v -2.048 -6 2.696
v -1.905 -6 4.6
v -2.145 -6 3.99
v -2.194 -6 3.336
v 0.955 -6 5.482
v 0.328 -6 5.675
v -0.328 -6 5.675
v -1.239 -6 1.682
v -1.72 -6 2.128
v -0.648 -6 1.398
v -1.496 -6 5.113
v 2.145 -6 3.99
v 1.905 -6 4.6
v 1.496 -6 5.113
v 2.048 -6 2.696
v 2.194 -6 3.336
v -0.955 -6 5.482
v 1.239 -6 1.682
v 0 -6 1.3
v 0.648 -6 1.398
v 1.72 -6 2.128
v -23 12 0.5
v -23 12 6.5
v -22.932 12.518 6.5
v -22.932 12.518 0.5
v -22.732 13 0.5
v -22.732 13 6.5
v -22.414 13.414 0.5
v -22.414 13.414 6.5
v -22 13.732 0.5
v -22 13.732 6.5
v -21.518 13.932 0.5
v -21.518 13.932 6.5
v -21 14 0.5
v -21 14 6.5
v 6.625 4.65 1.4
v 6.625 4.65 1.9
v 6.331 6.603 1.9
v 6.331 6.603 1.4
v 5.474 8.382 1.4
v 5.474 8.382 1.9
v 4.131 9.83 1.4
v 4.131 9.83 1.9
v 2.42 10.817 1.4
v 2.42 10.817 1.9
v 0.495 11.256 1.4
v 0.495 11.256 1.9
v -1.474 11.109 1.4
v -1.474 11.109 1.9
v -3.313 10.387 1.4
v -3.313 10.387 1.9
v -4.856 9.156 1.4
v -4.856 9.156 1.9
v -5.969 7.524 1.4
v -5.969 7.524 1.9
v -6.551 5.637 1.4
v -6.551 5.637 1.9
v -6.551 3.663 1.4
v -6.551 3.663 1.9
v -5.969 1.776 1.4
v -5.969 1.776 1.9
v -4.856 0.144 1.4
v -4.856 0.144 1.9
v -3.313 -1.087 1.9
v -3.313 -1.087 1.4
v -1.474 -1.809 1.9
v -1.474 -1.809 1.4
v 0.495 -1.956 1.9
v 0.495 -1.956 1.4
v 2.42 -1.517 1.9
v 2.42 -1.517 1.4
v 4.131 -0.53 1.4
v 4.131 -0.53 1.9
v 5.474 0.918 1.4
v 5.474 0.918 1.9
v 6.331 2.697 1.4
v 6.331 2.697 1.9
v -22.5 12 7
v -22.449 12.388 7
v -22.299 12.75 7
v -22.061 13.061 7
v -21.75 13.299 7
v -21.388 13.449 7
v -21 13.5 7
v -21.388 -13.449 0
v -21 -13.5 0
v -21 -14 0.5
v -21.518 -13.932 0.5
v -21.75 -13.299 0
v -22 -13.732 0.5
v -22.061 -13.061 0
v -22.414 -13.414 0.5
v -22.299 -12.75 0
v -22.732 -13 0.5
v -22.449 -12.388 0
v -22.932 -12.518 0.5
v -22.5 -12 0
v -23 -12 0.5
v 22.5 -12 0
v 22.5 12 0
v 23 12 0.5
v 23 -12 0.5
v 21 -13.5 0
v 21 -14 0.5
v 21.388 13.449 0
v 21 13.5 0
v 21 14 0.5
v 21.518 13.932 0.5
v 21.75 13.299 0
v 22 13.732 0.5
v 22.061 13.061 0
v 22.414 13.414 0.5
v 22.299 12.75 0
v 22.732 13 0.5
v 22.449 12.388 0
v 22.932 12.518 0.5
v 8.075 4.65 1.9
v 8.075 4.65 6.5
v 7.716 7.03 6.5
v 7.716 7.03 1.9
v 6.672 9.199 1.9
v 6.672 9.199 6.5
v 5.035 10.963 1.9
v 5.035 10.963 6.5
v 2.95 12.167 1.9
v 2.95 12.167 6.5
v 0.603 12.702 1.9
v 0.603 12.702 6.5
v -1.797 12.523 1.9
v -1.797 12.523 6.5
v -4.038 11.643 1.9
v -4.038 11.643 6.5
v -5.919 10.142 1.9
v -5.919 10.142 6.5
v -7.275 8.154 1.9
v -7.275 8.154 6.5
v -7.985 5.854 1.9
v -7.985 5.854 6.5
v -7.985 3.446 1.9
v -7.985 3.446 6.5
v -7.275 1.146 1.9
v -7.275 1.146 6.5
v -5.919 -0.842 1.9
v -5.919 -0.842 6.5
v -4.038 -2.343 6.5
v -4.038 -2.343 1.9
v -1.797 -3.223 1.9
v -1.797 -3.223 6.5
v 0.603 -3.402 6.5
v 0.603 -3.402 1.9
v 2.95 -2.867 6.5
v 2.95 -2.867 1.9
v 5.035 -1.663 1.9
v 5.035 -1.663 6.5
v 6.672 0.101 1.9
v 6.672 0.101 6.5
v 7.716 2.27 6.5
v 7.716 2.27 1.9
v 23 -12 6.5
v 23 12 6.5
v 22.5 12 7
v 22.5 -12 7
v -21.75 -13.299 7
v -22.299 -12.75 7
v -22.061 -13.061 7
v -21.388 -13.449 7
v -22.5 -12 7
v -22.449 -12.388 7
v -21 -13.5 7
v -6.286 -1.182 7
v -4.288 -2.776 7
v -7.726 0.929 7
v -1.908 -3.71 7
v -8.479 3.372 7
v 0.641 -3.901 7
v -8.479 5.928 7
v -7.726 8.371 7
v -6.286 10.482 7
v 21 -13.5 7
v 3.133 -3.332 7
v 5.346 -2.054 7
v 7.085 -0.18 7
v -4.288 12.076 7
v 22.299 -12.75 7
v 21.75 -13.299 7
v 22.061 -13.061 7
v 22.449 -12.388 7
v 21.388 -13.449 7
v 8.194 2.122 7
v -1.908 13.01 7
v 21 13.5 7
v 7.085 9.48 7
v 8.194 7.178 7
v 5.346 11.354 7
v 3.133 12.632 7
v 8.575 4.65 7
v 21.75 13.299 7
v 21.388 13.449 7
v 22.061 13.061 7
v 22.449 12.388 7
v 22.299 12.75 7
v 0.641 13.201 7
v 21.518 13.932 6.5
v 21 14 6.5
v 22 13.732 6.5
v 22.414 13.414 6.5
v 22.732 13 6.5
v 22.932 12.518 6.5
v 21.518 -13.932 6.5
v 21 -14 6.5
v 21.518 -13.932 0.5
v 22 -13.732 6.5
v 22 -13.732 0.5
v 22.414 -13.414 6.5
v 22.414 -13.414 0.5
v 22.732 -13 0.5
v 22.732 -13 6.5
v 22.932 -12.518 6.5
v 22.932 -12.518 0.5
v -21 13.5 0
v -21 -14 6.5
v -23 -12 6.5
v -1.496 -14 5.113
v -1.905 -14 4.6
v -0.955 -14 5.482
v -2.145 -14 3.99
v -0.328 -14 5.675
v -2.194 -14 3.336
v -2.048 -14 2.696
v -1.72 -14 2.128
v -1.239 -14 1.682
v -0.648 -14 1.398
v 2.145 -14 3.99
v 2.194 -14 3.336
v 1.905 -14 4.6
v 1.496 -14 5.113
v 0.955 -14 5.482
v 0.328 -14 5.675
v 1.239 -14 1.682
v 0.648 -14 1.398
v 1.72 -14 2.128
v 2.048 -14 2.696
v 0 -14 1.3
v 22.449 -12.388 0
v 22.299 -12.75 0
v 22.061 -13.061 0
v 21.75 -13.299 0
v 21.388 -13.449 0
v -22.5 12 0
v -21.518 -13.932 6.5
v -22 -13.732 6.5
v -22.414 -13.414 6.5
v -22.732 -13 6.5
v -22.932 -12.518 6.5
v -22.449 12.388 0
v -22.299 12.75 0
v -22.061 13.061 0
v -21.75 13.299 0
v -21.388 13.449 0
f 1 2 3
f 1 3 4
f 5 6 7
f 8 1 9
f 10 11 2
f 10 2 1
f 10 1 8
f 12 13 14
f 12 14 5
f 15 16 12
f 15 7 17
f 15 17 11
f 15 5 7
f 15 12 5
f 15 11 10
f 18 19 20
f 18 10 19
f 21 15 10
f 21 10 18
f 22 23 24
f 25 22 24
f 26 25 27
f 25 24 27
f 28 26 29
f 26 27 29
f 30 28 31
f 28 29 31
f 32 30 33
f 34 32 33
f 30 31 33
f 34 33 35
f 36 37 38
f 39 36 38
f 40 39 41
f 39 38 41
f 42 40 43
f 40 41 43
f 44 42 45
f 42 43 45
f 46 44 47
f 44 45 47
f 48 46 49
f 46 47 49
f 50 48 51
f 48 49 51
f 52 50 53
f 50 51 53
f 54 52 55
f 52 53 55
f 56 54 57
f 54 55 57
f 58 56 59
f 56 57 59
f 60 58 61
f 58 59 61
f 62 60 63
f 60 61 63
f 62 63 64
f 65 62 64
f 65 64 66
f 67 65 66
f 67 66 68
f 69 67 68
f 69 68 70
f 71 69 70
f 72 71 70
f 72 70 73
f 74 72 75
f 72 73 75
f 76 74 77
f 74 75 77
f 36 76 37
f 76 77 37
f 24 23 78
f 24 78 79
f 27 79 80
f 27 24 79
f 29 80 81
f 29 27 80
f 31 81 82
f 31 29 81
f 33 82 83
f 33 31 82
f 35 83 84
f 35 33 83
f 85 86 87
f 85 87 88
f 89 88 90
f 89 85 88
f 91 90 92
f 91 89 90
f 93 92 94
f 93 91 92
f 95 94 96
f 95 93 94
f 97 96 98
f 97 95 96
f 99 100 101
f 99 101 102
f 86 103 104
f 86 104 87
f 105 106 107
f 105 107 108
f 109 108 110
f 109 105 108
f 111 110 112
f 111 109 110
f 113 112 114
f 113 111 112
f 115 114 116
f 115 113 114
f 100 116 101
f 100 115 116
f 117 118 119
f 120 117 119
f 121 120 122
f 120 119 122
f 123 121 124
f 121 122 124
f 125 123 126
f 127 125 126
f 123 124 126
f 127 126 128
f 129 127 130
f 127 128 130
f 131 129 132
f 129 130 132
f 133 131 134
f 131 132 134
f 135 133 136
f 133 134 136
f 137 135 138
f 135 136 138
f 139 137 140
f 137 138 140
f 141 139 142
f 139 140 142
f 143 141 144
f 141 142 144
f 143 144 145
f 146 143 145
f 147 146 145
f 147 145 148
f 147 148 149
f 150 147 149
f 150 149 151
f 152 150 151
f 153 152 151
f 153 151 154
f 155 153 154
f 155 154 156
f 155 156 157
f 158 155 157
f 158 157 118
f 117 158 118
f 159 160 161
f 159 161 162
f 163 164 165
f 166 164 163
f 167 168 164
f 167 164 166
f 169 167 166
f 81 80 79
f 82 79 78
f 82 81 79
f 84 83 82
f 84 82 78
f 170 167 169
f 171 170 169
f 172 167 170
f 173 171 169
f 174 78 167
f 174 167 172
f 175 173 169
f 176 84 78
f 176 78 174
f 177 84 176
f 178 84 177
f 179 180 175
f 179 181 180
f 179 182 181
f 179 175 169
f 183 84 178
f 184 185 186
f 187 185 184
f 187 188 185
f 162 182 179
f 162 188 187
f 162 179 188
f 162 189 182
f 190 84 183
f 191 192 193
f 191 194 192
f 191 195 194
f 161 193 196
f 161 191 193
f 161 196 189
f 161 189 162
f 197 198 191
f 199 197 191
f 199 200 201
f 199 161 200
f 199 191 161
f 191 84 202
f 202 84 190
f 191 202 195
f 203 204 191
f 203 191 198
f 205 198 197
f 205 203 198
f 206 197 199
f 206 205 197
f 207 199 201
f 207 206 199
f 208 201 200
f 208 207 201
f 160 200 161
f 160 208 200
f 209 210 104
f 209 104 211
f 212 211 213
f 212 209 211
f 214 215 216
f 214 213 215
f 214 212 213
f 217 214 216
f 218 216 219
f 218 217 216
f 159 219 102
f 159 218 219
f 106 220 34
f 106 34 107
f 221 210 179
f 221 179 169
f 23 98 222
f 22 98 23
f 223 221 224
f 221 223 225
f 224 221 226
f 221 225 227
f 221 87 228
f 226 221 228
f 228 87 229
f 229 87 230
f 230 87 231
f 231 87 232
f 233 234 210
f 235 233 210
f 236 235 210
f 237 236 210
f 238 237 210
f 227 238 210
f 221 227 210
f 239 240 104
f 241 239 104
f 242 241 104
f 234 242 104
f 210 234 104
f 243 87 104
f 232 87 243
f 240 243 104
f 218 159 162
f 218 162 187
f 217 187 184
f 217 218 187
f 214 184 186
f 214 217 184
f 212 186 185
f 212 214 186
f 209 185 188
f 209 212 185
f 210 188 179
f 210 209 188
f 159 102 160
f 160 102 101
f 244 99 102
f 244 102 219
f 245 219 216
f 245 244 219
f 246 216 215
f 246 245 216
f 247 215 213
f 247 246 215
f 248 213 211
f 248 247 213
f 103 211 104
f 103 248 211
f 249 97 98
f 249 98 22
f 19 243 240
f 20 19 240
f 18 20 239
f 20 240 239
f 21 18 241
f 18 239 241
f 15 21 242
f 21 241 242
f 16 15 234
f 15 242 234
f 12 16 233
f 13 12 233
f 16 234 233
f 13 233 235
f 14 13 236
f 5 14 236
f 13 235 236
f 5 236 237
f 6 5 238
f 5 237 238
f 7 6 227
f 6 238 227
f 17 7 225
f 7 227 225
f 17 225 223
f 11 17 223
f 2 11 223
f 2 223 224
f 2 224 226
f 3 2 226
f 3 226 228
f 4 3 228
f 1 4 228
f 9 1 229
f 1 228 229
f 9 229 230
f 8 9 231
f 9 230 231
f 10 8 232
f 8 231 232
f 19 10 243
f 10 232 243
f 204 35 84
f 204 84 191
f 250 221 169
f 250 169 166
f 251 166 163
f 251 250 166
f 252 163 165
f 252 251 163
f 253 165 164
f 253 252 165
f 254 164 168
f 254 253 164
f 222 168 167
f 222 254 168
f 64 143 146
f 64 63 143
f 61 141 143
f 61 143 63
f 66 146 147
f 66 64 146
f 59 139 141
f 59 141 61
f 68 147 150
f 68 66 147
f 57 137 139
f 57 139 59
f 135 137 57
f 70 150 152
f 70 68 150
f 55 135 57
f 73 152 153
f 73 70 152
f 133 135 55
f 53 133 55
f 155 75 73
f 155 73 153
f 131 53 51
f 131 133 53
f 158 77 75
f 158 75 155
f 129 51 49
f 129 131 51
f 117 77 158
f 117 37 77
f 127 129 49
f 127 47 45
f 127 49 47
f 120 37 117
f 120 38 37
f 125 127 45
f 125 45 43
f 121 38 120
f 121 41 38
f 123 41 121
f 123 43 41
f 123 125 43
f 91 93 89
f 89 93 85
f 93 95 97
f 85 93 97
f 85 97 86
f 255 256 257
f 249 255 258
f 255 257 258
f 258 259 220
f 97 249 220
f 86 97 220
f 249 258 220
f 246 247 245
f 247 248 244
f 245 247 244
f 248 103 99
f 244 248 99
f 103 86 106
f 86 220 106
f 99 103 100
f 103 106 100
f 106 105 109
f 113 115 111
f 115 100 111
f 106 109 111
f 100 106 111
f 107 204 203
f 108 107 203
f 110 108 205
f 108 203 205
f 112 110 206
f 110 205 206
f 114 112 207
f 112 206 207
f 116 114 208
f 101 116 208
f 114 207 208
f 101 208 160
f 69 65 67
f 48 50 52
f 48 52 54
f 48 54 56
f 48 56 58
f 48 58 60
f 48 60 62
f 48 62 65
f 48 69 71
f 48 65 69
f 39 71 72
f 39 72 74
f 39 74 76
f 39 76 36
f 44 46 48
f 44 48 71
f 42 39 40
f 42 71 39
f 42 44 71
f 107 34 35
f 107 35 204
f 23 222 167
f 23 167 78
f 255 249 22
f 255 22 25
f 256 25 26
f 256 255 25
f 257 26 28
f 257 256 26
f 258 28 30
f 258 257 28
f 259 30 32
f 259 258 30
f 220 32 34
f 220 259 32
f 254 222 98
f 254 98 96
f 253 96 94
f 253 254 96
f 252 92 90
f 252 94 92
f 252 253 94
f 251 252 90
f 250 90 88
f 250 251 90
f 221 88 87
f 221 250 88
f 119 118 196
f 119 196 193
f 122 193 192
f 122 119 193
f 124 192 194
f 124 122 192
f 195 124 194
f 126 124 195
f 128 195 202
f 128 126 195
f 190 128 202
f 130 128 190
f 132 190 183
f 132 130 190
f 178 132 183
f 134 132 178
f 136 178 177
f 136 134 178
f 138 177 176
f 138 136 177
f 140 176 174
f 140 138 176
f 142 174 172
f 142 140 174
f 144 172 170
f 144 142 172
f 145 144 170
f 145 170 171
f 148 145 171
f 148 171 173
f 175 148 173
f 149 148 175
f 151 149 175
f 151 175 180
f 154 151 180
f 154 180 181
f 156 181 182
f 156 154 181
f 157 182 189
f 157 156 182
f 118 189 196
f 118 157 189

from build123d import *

# Parameters (mm, degrees)
SKIZZE1_W                       = 46
SKIZZE1_H                       = 28
AUFSATZ_LINEAR_AUSTRAGEN1_DEPTH = 7
SKIZZE2_R                       = 8.075
SCHNITT_LINEAR_AUSTRAGEN1_DEPTH = 5.6
AUFSATZ_LINEAR_START            = 0.5
SKIZZE10_R                      = 8.075
SKIZZE10_R_2                    = 6.625
AUFSATZ_LINEAR_AUSTRAGEN2_DEPTH = 0.5
VERRUNDUNG1_R                   = 2
SKIZZE11_R                      = 2.2
SCHNITT_LINEAR_AUSTRAGEN8_DEPTH = 8
FASE1_SIZE                      = 0.5


with BuildPart() as part:
    # Skizze1 → Aufsatz-Linear austragen1 (new body)
    with BuildSketch(Plane.XY):
        Rectangle(SKIZZE1_W, SKIZZE1_H)
    extrude(amount=AUFSATZ_LINEAR_AUSTRAGEN1_DEPTH)

    # Skizze2 → Schnitt-Linear austragen1 (cut)
    with BuildSketch(Plane.XY.offset(7)):
        with Locations((0, 4.65)):
            Circle(SKIZZE2_R)
    extrude(amount=-SCHNITT_LINEAR_AUSTRAGEN1_DEPTH, mode=Mode.SUBTRACT)

    # Skizze10 → Aufsatz-Linear austragen2 (add)
    with BuildSketch(Plane.XY.offset(1.4).offset(AUFSATZ_LINEAR_START)):
        with Locations((0, 4.65)):
            Circle(SKIZZE10_R)
        with Locations((0, 4.65)):
            Circle(SKIZZE10_R_2, mode=Mode.SUBTRACT)
    extrude(amount=-AUFSATZ_LINEAR_AUSTRAGEN2_DEPTH)

    # Verrundung1
    verrundung1_edges = [part.edges().sort_by_distance(p)[0] for p in [
        (23, 14, 3.5),
        (23, -14, 3.5),
        (-23, 14, 3.5),
        (-23, -14, 3.5),
    ]]
    fillet(verrundung1_edges, radius=VERRUNDUNG1_R)

    # Skizze11 → Schnitt-Linear austragen8 (cut)
    with BuildSketch(Plane.XZ.offset(14)):
        with Locations((0, 3.5)):
            Circle(SKIZZE11_R)
    extrude(amount=-SCHNITT_LINEAR_AUSTRAGEN8_DEPTH, mode=Mode.SUBTRACT)

    # Fase1
    fase1_edges = [part.edges().sort_by_distance(p)[0] for p in [
        (22.414213562, -13.414213562, 7),
        (0, -14, 7),
        (-22.414213562, -13.414213562, 7),
        (-23, 0, 7),
        (-22.414213562, 13.414213562, 7),
        (0, 14, 7),
        (22.414213562, 13.414213562, 7),
        (23, 0, 7),
        (-8.075, 4.65, 7),
        (-22.414213562, 13.414213562, 0),
        (-23, 0, 0),
        (-22.414213562, -13.414213562, 0),
        (0, -14, 0),
        (22.414213562, -13.414213562, 0),
        (23, 0, 0),
        (22.414213562, 13.414213562, 0),
        (0, 14, 0),
    ]]
    chamfer(fase1_edges, length=FASE1_SIZE)


solid = part.part
